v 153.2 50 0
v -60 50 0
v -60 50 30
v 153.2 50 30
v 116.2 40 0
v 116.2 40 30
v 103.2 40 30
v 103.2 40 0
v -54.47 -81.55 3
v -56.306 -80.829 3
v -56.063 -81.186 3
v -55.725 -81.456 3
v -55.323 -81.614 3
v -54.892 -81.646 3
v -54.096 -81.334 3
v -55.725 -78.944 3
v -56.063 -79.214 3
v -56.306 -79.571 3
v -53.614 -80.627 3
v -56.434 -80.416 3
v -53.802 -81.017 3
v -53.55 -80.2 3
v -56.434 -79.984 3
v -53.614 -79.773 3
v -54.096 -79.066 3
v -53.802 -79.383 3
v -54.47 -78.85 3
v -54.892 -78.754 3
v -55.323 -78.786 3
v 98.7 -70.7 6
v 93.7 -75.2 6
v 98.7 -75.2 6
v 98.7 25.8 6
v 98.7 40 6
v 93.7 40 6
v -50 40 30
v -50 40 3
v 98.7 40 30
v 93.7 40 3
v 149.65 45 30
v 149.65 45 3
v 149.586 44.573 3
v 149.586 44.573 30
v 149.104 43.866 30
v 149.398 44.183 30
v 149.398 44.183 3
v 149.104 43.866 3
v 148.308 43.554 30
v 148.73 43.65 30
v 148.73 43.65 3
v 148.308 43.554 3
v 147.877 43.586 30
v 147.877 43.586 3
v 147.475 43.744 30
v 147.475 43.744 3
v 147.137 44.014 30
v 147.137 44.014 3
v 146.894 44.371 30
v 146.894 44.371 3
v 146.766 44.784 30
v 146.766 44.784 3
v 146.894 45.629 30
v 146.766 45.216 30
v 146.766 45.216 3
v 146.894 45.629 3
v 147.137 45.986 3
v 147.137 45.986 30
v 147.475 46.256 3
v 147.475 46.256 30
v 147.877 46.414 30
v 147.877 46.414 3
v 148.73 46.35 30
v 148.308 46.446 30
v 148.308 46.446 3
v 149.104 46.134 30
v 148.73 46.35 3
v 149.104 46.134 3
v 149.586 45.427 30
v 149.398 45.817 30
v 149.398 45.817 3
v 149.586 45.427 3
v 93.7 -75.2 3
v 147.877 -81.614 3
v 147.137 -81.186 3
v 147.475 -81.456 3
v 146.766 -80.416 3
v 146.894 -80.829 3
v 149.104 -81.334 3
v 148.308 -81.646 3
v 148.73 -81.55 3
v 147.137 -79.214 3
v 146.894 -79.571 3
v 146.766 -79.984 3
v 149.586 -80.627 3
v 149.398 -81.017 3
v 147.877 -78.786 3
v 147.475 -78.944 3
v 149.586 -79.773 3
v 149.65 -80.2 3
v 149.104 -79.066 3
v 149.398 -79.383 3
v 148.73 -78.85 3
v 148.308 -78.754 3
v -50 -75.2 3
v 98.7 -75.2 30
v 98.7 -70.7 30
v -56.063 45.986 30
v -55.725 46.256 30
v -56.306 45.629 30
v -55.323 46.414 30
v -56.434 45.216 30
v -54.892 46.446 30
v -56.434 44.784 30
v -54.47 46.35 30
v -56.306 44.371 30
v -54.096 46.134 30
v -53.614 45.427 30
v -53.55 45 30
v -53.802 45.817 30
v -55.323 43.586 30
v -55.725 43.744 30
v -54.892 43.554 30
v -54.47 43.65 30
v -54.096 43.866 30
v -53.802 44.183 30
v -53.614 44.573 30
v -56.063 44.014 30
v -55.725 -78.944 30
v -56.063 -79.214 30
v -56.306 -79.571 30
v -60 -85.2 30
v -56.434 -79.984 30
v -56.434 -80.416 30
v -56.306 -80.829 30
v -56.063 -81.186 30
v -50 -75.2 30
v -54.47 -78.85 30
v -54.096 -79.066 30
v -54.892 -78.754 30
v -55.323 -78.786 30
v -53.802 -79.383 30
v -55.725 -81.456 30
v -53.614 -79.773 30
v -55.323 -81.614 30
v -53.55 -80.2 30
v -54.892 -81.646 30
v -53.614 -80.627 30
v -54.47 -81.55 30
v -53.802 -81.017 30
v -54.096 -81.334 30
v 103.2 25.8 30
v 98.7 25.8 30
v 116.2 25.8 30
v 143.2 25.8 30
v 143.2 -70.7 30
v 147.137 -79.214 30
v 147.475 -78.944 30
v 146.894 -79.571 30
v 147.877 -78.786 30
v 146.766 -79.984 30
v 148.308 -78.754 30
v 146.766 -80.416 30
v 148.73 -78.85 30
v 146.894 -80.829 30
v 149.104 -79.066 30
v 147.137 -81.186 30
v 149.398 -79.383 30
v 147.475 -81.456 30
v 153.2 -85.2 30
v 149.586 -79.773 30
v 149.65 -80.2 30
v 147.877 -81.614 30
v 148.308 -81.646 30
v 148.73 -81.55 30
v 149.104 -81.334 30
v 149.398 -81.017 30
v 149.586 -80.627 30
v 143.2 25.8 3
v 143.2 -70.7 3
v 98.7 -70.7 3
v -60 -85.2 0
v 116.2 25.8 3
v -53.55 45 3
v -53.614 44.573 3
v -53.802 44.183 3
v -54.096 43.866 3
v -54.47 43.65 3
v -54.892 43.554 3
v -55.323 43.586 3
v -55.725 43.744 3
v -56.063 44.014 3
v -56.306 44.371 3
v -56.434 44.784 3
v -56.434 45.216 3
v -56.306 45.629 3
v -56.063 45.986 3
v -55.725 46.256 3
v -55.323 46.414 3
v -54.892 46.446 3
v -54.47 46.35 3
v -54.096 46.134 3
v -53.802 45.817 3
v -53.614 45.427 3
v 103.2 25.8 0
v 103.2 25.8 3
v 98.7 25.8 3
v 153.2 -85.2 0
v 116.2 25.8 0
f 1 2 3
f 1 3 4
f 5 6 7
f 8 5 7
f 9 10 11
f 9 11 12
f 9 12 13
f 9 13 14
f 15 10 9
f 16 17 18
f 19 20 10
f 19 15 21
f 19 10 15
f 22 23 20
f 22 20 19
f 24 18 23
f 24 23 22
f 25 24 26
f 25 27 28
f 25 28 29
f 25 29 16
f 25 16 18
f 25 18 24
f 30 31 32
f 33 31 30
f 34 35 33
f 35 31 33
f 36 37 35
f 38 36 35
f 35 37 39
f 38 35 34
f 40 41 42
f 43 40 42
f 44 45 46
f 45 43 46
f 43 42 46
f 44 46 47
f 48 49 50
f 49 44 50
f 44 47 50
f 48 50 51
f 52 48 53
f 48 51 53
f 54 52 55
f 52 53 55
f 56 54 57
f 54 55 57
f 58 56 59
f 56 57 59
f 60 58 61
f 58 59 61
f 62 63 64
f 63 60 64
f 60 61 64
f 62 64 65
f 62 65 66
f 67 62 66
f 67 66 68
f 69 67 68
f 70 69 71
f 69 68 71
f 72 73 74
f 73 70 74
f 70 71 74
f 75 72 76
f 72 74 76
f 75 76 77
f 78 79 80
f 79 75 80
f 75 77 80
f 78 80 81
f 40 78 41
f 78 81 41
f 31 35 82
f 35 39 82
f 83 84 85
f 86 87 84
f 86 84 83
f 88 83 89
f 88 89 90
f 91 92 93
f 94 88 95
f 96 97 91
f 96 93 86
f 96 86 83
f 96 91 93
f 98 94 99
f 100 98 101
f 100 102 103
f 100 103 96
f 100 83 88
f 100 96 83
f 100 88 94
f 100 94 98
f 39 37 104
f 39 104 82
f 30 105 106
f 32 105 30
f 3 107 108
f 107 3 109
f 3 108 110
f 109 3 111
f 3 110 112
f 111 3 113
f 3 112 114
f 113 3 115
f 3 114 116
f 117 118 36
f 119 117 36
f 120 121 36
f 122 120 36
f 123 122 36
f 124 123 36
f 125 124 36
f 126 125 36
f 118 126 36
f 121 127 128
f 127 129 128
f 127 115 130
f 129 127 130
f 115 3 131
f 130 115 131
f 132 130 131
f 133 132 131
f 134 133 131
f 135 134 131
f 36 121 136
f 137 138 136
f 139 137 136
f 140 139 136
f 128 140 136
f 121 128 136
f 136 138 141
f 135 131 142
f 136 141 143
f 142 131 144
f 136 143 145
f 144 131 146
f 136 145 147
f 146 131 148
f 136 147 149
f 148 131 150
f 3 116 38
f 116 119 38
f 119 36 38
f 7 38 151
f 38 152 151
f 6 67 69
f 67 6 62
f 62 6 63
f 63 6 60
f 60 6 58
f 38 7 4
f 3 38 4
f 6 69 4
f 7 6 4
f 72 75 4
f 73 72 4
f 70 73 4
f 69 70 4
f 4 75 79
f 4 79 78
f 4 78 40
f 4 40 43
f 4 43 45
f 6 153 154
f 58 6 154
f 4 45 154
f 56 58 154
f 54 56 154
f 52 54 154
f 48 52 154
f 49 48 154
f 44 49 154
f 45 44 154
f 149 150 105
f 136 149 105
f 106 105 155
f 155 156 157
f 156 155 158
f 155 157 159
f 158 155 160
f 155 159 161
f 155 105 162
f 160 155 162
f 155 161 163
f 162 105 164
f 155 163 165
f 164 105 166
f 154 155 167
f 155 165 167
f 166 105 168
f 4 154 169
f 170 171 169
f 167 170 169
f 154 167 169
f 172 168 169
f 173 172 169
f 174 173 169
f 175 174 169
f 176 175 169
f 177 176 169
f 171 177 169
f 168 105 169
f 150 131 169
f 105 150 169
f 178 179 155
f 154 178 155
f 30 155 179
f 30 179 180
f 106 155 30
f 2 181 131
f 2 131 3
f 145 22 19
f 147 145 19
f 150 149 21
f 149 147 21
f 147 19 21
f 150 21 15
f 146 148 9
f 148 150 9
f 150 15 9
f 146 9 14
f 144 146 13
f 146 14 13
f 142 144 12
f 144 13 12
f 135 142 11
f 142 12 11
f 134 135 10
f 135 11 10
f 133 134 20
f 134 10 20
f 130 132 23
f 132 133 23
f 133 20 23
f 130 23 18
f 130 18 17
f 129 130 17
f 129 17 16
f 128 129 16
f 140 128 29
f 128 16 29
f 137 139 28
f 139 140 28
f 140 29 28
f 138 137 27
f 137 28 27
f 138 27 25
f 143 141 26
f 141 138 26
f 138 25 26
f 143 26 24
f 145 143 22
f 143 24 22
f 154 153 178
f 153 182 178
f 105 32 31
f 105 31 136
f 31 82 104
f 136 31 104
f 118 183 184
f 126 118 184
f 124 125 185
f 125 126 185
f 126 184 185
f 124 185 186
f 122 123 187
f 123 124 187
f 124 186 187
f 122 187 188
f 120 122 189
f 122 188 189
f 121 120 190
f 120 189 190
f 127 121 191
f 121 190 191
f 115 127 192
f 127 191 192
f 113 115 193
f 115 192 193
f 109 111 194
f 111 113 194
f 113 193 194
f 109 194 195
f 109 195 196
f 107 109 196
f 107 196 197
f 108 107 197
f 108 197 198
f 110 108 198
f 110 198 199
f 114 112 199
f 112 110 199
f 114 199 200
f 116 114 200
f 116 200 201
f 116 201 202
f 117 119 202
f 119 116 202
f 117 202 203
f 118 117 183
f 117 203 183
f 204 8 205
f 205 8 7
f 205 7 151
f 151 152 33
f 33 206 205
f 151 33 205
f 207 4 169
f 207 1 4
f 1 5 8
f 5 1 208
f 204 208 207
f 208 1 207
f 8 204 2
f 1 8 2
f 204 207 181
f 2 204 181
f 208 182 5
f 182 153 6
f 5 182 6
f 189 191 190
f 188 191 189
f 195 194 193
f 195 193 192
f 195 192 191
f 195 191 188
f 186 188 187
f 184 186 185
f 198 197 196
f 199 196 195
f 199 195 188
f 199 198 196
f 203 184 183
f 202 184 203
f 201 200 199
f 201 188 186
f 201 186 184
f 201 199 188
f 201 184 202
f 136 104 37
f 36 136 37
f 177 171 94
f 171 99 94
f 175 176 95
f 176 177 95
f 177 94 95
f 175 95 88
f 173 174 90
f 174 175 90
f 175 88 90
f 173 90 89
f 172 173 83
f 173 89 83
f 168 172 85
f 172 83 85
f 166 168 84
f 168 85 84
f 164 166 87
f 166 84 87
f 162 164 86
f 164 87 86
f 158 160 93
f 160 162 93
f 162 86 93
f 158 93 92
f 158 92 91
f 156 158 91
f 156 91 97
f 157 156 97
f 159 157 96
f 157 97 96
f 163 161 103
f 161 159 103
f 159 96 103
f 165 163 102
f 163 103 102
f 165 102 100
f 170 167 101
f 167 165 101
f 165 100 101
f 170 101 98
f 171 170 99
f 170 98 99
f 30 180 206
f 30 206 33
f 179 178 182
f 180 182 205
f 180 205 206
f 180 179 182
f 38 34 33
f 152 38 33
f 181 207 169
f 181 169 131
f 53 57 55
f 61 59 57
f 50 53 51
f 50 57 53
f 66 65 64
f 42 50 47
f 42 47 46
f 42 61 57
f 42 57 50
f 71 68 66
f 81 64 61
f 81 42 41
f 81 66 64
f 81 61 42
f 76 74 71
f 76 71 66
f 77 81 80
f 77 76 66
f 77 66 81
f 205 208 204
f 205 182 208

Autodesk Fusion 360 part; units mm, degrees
sketch "Sketch1" plane through (0, 0, 0) normal (0, 0, 1) x (1, 0, 0)
  line L0 (-50, 40) -> (143.2, 40)
  line L1 (143.2, 40) -> (143.2, -75.2)
  line L2 (143.2, -75.2) -> (-50, -75.2)
  line L3 (-50, -75.2) -> (-50, 40)
  line L4 (-60, 50) -> (153.2, 50)
  line L5 (153.2, 50) -> (153.2, -85.2)
  line L6 (153.2, -85.2) -> (-60, -85.2)
  line L7 (-60, -85.2) -> (-60, 50)
  circle A0 centre (-55, 45) radius 1.45
  circle A1 centre (148.2, 45) radius 1.45
  circle A2 centre (148.2, -80.2) radius 1.45
  circle A3 centre (-55, -80.2) radius 1.45
  line L8 (143.2, -75.2) -> (98.7, -75.2)
  line L9 (98.7, -75.2) -> (98.7, 21.3)
  line L10 (98.7, 21.3) -> (143.2, 21.3)
  line L11 (143.2, 21.3) -> (143.2, -75.2)
  line L12 (98.7, 21.3) -> (143.2, 21.3)
  line L13 (143.2, 21.3) -> (143.2, 40)
  line L14 (143.2, 40) -> (98.7, 40)
  line L15 (98.7, 40) -> (98.7, 21.3)
  line L16 (98.7, 40) -> (93.7, 40)
  line L17 (93.7, 40) -> (93.7, -75.2)
  line L18 (93.7, -75.2) -> (98.7, -75.2)
  line L19 (98.7, -75.2) -> (98.7, 40)
  dimension "d1" = 193.2
  dimension "d2" = 115.2
  dimension "d3" = 213.2
  dimension "d4" = 135.2
  dimension "d5" = 10
  dimension "d6" = 10
  dimension "d7" = 2.9
  dimension "d8" = 5
  dimension "d9" = 5
  dimension "d10" = 2.9
  dimension "d11" = 5
  dimension "d12" = 5
  dimension "d13" = 2.9
  dimension "d14" = 5
  dimension "d15" = 5
  dimension "d16" = 2.9
  dimension "d17" = 5
  dimension "d18" = 5
  dimension "d19" = 44.5
  dimension "d20" = 96.5
  dimension "d21" = 5
extrude "Extrude1" add sketch "Sketch1" along normal blind 3 contours L0 L2 L3 L17 | L1 L2 L8 L9 L10 L11 L12 L19 makes body 1 at (113.5333, -43.0333, 0) makes body 2 at (-2.1, 1.6, 0)
extrude "Extrude2" add sketch "Sketch1" along normal blind 6 contours L0 L2 L9 L15 L16 L17 L18 L19 bodies 1 2
extrude "Extrude3" add sketch "Sketch1" along normal blind 3 separate body contours A0 | A1 | A2 | A3 makes body 3 at (149.5361, -79.6368, 2) makes body 4 at (-54.0406, -79.1128, 2) makes body 5 at (149.3558, 45.8755, 2) makes body 6 at (-56.4213, 45.2873, 2)
extrude "Extrude4" add sketch "Sketch1" along normal blind 30 contours L0 L1 L10 L12 L13 L14 L15 L19 | L4 L5 L6 L7 bodies 1 3 4 5 6
sketch "Sketch2" plane through (0, 21.3, 0) normal (0, -1, 0) x (1, 0, 0)
  line L0 (98.7, 3) -> (143.2, 3)
  line L1 (143.2, 3) -> (143.2, 30)
  line L2 (143.2, 30) -> (98.7, 30)
  line L3 (98.7, 30) -> (98.7, 6)
  line L4 (98.7, 6) -> (98.7, 3)
  line L5 (103.2, 30) -> (116.2, 30)
  line L6 (116.2, 30) -> (116.2, 3)
  line L7 (116.2, 3) -> (103.2, 3)
  line L8 (103.2, 3) -> (103.2, 30)
  dimension "d30" = 13
  dimension "d32" = 4.5
extrude "Extrude5" cut sketch "Sketch2" against normal blind 18.7 contours L0 L2 L5 L6 L7 L8 bodies 1
sketch "Sketch3" plane through (0, 0, 3) normal (0, 0, 1) x (-1, 0, 0)
  line L0 (-98.7, 75.2) -> (-143.2, 75.2)
  line L1 (-143.2, 75.2) -> (-143.2, -21.3)
  line L2 (-143.2, -21.3) -> (-116.2, -21.3)
  line L3 (-116.2, -21.3) -> (-116.2, -40)
  line L4 (-116.2, -40) -> (-103.2, -40)
  line L5 (-103.2, -40) -> (-103.2, -21.3)
  line L6 (-103.2, -21.3) -> (-98.7, -21.3)
  line L7 (-98.7, -21.3) -> (-98.7, 75.2)
  line L8 (-103.2, -40) -> (-116.2, -40)
  line L9 (-116.2, -40) -> (-116.2, -21.3)
  line L10 (-116.2, -21.3) -> (-103.2, -21.3)
  line L11 (-103.2, -21.3) -> (-103.2, -40)
extrude "Extrude6" cut sketch "Sketch3" against normal blind 6 contours L3 L4 L5 L8 L9 L10 L11 bodies 1
sketch "Sketch4" plane through (0, -75.2, 0) normal (0, 1, 0) x (-1, 0, 0)
  line L0 (-143.2, 3) -> (-98.7, 3)
  line L1 (-98.7, 3) -> (-98.7, 6)
  line L2 (-98.7, 6) -> (-93.7, 6)
  line L3 (-93.7, 6) -> (-93.7, 3)
  line L4 (-93.7, 3) -> (50, 3)
  line L5 (50, 3) -> (50, 30)
  line L6 (50, 30) -> (-143.2, 30)
  line L7 (-143.2, 30) -> (-143.2, 3)
  line L8 (-98.7, 3) -> (-143.2, 3)
  line L9 (-143.2, 3) -> (-143.2, 30)
  line L10 (-143.2, 30) -> (-98.7, 30)
  line L11 (-98.7, 30) -> (-98.7, 3)
extrude "Extrude7" add sketch "Sketch4" along normal blind 4.5 contours L0 L1 L6 L7 L8 L9 L10 L11 bodies 1
extrude "Extrude8" cut 2 faces at (101.7, 21.3, 13) (125.2, 21.3, 12) along direction (0, 1, 0) blind 4.5 on bodies 1 bodies 1
extrude "Extrude9" add 1 faces at (111.8667, 21.3, 2) along direction (0, 1, 0) blind 4.5 on bodies 1 bodies 1
equation "d3 = 193.2 mm + 20 mm"
equation "d4 = 115.2 mm + 20 mm"
